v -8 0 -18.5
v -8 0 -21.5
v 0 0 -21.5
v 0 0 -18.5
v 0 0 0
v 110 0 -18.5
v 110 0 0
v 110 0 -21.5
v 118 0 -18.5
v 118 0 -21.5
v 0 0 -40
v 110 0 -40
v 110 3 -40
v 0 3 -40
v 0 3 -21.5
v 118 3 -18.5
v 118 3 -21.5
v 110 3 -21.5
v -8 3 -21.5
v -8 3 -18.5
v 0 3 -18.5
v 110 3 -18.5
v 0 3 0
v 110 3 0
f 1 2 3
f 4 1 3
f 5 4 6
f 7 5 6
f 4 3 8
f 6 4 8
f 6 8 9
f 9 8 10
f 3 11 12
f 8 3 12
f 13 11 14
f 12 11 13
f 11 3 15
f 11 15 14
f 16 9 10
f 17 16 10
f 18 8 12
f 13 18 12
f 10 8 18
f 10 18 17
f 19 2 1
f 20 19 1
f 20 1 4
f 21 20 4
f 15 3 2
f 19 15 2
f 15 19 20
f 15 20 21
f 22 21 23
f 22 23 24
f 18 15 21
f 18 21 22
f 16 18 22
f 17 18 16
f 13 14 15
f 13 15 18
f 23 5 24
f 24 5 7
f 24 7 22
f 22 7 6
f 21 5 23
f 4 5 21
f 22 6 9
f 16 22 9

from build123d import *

# Parameters (mm, degrees)
SKETCH1_W           = 8
SKETCH1_H           = 1.5
SKETCH1_W_2         = 110
SKETCH1_H_2         = 18.5
BOSS_EXTRUDE1_DEPTH = 3


with BuildPart() as part:
    # Sketch1 → Boss-Extrude1 (new body)
    with BuildSketch(Plane(origin=(0, 0, 0), x_dir=(1, 0, 0), z_dir=(0, 1, 0))):
        with Locations((-4, 20.75)):
            Rectangle(SKETCH1_W, SKETCH1_H)
        with Locations((-4, 19.25)):
            Rectangle(SKETCH1_W, SKETCH1_H)
        Polygon((0, 20), (0, 18.5), (110, 18.5), (110, 20), (110, 21.5), (0, 21.5), align=None)
        with Locations((55, 30.75)):
            Rectangle(SKETCH1_W_2, SKETCH1_H_2)
        with Locations((55, 9.25)):
            Rectangle(SKETCH1_W_2, SKETCH1_H_2)
        with Locations((114, 20.75)):
            Rectangle(SKETCH1_W, SKETCH1_H)
        with Locations((114, 19.25)):
            Rectangle(SKETCH1_W, SKETCH1_H)
    extrude(amount=BOSS_EXTRUDE1_DEPTH)


solid = part.part
